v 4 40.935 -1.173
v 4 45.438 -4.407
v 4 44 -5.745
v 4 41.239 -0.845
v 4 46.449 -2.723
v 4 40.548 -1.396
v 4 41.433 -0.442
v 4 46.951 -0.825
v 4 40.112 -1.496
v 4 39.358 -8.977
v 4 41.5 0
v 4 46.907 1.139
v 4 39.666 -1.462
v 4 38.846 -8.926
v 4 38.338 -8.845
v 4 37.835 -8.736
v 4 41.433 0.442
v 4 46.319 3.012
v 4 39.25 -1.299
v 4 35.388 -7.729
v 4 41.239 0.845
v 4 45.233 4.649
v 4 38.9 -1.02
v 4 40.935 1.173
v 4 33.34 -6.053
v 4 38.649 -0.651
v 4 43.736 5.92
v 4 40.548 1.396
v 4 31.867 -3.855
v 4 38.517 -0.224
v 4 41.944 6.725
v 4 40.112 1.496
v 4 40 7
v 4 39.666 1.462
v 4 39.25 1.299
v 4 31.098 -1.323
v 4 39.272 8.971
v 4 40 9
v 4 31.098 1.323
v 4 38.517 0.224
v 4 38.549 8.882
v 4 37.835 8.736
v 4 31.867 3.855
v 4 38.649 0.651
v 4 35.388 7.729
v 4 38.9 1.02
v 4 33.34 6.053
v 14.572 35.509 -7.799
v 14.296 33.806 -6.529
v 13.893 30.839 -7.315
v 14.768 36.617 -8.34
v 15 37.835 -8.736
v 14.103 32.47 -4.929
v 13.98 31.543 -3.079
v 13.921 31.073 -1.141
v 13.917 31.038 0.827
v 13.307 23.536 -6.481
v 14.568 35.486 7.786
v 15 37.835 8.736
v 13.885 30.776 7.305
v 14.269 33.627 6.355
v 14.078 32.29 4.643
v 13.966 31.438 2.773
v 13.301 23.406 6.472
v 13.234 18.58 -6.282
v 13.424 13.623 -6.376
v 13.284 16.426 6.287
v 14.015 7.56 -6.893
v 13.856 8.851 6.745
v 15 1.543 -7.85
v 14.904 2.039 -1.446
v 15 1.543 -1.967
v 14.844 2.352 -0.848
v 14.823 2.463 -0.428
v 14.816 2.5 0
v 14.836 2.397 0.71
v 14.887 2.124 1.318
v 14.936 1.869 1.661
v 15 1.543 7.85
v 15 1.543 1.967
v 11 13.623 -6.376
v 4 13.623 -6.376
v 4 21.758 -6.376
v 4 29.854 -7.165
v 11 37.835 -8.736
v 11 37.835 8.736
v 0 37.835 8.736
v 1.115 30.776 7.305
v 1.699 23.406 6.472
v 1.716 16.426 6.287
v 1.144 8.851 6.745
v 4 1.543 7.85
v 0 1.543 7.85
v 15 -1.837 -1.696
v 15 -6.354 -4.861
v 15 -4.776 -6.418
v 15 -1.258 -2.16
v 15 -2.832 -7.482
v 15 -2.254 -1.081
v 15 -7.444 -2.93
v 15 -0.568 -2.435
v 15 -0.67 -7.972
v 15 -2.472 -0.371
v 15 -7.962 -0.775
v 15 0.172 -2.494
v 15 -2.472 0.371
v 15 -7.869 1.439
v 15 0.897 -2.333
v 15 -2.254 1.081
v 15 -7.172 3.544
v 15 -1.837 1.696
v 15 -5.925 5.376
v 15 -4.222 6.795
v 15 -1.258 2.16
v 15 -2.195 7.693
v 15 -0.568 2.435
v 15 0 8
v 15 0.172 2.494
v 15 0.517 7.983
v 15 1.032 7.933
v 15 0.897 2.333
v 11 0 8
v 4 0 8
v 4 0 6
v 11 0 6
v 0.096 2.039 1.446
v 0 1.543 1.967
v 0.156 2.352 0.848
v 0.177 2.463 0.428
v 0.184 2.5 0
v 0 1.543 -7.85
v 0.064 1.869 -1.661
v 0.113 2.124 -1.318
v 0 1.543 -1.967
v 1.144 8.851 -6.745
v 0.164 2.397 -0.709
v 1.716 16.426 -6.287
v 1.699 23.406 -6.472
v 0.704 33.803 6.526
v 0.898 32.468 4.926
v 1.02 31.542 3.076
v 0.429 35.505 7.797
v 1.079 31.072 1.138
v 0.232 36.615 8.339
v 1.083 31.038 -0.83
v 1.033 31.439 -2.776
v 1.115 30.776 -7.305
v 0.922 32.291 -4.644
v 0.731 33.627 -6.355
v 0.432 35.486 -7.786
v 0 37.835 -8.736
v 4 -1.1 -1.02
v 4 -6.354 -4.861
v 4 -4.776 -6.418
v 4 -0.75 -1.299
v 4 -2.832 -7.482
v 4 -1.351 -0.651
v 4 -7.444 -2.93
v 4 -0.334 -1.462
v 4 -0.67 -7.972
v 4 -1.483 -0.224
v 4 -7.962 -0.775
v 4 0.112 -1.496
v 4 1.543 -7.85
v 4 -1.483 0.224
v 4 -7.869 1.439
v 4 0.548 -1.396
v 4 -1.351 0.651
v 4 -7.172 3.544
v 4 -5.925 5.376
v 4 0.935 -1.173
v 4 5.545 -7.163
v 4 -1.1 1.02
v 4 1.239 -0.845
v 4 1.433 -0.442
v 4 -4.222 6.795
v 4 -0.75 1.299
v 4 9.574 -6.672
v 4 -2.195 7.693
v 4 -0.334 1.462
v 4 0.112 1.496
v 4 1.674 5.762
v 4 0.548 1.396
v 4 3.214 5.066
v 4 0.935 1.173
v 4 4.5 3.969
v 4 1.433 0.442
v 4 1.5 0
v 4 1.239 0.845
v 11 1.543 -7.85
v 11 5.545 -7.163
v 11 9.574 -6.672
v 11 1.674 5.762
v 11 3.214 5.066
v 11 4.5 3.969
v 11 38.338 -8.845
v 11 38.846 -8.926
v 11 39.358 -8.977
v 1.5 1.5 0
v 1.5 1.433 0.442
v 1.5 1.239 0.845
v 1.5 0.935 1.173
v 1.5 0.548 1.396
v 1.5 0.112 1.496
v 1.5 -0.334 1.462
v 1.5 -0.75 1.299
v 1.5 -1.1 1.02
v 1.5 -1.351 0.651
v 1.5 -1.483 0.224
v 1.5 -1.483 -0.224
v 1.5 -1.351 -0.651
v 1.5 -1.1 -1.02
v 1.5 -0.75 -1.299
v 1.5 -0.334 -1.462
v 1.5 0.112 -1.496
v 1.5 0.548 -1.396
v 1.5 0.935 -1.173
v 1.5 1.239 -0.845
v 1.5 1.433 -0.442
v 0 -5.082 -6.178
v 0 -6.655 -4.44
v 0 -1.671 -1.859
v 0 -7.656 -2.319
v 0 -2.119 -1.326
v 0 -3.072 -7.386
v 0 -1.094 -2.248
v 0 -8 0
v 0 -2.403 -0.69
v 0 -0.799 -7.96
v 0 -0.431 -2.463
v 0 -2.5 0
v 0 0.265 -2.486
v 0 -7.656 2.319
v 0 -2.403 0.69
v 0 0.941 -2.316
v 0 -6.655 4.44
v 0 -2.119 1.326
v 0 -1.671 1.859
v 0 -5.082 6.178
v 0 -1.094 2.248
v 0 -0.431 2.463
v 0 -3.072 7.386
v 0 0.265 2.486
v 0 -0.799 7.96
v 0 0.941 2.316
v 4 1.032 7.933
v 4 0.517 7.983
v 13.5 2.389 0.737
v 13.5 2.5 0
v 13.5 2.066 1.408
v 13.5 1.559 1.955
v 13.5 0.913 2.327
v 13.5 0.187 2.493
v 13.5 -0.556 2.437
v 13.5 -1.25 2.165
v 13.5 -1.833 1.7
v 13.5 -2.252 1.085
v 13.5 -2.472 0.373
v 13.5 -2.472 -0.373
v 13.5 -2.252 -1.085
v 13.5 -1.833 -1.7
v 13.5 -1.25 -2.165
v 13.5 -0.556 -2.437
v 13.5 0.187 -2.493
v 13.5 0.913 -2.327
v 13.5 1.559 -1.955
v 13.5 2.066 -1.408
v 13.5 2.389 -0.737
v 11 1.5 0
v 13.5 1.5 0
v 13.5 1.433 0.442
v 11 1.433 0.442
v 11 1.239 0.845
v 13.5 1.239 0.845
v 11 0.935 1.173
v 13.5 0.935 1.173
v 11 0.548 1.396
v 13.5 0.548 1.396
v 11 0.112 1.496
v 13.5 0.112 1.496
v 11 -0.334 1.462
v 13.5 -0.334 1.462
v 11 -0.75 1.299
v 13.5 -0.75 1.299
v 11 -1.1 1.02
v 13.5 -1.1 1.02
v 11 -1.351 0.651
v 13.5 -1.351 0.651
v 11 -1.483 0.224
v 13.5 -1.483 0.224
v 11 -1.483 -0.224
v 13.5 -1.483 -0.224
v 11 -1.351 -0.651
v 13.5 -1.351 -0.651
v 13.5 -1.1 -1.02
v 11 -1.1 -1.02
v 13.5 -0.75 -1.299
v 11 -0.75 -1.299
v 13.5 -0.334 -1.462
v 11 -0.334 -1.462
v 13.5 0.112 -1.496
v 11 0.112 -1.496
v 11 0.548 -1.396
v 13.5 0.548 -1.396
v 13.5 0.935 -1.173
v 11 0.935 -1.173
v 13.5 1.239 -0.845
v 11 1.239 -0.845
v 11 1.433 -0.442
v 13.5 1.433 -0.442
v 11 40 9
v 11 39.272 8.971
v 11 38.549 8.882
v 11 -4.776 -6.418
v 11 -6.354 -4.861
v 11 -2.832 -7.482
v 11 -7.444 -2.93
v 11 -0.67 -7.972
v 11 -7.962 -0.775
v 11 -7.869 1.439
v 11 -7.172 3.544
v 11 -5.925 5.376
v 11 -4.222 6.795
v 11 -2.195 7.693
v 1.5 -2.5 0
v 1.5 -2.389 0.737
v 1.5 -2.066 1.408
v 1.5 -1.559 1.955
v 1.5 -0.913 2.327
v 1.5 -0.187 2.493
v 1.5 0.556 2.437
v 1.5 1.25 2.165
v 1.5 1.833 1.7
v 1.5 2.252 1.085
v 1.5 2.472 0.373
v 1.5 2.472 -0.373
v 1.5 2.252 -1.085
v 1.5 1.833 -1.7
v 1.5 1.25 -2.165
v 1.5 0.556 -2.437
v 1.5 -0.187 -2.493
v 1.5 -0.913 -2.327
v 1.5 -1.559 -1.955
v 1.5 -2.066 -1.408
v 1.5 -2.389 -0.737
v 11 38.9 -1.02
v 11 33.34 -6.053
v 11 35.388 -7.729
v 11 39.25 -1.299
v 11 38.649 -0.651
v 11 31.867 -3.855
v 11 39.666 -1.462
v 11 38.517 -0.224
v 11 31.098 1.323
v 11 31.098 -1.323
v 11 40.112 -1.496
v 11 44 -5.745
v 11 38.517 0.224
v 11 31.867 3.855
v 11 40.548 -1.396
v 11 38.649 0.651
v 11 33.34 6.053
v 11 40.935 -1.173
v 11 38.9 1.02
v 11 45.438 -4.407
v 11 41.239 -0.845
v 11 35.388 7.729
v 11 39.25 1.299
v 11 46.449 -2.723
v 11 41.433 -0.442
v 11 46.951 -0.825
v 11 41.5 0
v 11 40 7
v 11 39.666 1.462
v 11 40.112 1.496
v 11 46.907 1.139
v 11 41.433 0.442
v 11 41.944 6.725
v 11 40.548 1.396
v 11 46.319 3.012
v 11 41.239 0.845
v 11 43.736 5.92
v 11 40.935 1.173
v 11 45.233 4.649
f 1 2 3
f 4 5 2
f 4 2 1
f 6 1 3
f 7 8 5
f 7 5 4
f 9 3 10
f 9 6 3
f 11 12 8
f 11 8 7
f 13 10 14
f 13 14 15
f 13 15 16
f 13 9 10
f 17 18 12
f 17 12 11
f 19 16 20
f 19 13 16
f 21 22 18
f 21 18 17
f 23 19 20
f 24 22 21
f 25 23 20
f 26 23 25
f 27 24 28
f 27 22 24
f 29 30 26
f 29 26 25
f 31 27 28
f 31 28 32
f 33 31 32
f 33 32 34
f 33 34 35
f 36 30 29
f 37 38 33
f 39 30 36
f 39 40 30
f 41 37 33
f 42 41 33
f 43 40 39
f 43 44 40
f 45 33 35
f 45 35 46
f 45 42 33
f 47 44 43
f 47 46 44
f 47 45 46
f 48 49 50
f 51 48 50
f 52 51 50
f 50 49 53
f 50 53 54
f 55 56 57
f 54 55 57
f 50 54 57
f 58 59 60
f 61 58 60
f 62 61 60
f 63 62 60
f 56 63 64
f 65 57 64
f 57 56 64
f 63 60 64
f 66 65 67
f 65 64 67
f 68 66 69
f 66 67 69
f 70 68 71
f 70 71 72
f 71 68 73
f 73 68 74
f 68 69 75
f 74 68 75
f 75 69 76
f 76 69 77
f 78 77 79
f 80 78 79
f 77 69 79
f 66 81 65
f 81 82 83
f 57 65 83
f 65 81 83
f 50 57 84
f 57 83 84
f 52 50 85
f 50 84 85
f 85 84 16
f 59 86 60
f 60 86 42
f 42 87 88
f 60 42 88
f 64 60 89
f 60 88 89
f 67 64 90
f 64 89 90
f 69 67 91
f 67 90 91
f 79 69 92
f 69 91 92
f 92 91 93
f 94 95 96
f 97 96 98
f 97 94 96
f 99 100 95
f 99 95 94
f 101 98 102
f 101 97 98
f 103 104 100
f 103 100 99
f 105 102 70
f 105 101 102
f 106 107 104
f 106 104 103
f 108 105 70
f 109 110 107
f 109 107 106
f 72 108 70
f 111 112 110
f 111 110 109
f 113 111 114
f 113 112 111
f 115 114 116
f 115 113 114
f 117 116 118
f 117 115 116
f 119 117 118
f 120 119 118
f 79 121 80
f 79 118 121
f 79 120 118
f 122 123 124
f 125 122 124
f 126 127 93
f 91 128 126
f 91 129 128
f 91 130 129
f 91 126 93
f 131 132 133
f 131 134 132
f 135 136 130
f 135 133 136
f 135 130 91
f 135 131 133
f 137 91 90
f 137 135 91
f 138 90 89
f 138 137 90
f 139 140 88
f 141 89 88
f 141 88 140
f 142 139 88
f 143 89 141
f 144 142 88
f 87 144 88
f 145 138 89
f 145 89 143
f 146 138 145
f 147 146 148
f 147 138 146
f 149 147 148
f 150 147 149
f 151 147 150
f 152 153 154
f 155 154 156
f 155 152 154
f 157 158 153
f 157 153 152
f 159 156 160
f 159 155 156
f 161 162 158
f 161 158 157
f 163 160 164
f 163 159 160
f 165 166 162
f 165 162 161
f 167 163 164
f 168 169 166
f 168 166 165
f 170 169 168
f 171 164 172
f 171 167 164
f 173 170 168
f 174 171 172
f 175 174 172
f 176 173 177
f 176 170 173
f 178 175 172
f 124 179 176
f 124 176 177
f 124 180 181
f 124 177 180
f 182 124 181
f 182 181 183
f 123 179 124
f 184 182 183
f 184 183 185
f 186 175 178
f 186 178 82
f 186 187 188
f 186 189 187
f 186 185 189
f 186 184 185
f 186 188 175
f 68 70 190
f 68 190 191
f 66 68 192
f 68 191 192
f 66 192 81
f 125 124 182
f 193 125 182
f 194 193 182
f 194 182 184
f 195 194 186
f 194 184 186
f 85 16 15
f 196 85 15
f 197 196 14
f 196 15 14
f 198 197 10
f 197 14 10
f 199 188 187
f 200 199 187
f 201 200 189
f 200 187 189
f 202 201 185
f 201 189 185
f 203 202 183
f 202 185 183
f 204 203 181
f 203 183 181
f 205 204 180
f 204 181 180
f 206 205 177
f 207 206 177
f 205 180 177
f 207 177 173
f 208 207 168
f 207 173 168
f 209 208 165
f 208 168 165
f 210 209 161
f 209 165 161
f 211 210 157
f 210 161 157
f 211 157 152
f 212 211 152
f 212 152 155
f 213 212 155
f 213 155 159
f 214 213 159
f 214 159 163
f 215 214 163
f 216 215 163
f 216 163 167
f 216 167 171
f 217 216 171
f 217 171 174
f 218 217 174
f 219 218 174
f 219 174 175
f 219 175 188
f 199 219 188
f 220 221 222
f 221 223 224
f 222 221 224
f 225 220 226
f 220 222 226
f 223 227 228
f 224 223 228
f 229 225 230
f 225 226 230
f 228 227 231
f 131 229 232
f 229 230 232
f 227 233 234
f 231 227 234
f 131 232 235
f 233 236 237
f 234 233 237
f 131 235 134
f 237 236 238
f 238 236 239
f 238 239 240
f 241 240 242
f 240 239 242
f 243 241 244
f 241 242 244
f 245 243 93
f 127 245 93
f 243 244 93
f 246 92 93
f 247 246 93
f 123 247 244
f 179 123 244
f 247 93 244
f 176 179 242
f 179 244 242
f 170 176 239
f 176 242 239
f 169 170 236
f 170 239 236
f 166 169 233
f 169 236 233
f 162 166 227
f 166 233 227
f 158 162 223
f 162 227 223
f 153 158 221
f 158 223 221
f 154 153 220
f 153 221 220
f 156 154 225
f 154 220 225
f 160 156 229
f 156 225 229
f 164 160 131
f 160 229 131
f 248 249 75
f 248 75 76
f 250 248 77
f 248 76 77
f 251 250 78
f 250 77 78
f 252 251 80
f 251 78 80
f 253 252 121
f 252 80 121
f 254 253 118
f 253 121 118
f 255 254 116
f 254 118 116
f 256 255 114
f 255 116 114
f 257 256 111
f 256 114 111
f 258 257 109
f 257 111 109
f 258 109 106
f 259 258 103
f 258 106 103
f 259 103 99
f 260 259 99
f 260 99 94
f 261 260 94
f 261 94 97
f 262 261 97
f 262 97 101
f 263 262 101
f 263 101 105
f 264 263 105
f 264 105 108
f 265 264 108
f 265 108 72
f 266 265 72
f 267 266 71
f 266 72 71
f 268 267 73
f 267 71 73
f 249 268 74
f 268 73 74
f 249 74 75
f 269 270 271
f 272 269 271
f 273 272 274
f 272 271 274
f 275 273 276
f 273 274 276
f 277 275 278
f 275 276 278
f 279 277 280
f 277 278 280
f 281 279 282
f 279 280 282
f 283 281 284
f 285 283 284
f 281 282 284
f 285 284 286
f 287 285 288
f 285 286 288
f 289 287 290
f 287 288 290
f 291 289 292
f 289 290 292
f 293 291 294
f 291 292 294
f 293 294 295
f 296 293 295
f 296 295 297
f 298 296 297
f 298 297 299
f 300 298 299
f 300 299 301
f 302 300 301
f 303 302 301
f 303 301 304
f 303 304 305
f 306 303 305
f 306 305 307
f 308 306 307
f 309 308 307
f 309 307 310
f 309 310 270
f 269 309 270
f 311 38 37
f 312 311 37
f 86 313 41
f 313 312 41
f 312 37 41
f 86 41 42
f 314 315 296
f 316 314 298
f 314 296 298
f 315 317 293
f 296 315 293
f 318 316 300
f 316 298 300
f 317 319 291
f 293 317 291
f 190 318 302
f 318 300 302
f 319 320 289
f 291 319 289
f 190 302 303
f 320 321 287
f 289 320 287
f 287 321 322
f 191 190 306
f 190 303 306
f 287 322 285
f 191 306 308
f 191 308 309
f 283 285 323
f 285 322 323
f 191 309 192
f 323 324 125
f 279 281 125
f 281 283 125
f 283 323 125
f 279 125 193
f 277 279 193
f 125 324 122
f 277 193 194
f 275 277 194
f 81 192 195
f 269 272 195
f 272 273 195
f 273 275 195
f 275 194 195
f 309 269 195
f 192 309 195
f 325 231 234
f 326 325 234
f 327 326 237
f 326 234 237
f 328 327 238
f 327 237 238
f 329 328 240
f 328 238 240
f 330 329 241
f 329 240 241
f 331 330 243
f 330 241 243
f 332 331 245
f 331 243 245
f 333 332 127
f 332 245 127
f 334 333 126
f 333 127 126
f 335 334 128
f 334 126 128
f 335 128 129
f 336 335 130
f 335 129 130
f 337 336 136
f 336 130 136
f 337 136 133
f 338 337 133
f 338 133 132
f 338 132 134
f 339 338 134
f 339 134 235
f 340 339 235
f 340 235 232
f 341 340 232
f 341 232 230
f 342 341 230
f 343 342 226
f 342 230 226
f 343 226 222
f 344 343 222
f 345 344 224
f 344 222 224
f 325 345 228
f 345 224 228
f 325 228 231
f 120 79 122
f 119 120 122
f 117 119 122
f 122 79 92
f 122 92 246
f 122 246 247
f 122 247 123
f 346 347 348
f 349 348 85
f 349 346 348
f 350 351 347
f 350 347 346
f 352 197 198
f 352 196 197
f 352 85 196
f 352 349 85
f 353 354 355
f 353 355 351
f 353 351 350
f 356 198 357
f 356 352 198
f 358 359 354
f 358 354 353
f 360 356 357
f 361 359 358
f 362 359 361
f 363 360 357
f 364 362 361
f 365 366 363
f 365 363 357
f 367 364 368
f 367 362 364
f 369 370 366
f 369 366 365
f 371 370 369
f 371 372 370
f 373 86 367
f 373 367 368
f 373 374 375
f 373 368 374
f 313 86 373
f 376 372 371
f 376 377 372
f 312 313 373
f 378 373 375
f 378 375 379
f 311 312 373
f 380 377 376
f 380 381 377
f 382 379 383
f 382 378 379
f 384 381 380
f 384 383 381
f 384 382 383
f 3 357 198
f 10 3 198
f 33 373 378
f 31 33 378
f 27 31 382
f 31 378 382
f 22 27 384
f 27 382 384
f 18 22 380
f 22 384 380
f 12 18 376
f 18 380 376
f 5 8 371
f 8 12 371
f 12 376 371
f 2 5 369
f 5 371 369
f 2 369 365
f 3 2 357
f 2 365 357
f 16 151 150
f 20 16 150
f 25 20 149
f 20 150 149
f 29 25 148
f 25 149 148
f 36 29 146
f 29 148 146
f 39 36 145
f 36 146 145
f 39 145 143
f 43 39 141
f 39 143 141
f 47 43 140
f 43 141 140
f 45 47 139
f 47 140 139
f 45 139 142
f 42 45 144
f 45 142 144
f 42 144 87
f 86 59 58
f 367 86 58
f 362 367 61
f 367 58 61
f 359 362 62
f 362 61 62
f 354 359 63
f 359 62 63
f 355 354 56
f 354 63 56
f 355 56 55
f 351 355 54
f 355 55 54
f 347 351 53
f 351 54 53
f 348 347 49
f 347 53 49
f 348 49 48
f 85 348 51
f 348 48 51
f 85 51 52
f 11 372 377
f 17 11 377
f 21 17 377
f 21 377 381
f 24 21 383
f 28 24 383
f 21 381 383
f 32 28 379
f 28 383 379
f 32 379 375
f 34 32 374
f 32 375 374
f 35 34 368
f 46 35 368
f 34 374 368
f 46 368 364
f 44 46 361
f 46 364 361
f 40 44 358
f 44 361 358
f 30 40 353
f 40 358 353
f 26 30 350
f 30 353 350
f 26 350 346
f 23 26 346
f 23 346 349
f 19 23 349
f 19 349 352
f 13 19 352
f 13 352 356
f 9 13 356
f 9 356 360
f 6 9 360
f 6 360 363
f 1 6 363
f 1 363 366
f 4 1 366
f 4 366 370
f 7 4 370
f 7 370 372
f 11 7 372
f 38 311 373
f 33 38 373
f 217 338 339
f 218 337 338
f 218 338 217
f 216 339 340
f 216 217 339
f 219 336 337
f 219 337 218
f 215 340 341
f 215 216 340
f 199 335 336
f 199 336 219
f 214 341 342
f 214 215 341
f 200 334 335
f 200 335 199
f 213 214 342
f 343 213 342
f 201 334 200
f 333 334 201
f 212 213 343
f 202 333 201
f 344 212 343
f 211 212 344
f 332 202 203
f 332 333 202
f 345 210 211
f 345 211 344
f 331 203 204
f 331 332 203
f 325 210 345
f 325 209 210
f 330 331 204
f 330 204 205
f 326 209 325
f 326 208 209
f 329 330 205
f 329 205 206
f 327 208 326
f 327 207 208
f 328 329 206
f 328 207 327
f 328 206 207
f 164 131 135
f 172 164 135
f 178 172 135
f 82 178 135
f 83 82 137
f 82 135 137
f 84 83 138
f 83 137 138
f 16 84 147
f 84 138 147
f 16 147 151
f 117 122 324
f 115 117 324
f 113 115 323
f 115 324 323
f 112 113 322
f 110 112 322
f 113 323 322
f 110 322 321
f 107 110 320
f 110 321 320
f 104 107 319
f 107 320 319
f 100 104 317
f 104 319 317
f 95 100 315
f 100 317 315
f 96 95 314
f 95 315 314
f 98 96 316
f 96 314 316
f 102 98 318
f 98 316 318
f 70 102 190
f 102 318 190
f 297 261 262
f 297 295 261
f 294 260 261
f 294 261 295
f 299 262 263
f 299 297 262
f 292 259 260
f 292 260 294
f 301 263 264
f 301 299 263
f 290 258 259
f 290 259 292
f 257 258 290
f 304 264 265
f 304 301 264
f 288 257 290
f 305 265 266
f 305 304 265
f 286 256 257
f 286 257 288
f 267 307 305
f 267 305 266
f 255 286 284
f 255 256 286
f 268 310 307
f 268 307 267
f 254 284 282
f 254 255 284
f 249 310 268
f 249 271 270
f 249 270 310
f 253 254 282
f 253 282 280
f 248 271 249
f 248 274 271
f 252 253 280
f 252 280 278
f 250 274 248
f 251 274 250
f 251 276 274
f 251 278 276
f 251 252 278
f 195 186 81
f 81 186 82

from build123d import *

# Parameters (mm, degrees)
F1_DEPTH  = 4
F3_DEPTH  = 7
F5_DEPTH  = 4
F6_R      = 9
F7_DEPTH  = 4
F8_R      = 9
F9_DEPTH  = 4
F10_R     = 2.5
F11_DEPTH = 1.5
F12_R     = 93.772443
F13_DEPTH = 12.5
F14_R     = 1.5
F15_DEPTH = 11.001
F16_R     = 1.5
F17_DEPTH = 15.001
F18_R     = 2.5
F19_DEPTH = 1.5
F21_DEPTH = 11.001


with BuildPart() as f1:
    # F0 (on Right) → F1 (new body)
    with BuildSketch(Plane.YZ):
        with BuildLine():
            ThreePointArc((37.834946, 8.735705), (19.737718, 6.302024), (1.543294, 7.849729))
            ThreePointArc((1.543294, 7.849729), (-8, 0), (1.543294, -7.849729))
            ThreePointArc((1.543294, -7.849729), (19.737718, -6.302024), (37.834946, -8.735705))
            ThreePointArc((37.834946, -8.735705), (49, 0), (37.834946, 8.735705))
        make_face()
    extrude(amount=F1_DEPTH)

    # F2 (on face) → F3 (join)
    with BuildSketch(Plane.YZ.offset(4)):
        with BuildLine():
            ThreePointArc((13.623219, -6.376131), (25.815239, -6.671862), (37.834946, -8.735705))
            ThreePointArc((37.834946, -8.735705), (49, 0), (37.834946, 8.735705))
            ThreePointArc((37.834946, 8.735705), (19.737718, 6.302024), (1.543294, 7.849729))
            ThreePointArc((1.543294, 7.849729), (0.775296, 7.962344), (0, 8))
            Line((0, 8), (0, 6))
            ThreePointArc((0, 6), (2.468627, 5.468627), (4.5, 3.968627))
            Line((4.5, 3.968627), (13.623219, -6.376131))
        make_face()
    extrude(amount=F3_DEPTH)

    # F4 (on face) → F5 (join)
    with BuildSketch(Plane.YZ.offset(11)):
        with BuildLine():
            ThreePointArc((37.834946, 8.735705), (19.737718, 6.302024), (1.543294, 7.849729))
            ThreePointArc((1.543294, 7.849729), (0.775296, 7.962344), (0, 8))
            ThreePointArc((0, 8), (-7.962344, -0.775296), (1.543294, -7.849729))
            ThreePointArc((1.543294, -7.849729), (7.556447, -6.893156), (13.623219, -6.376131))
            ThreePointArc((13.623219, -6.376131), (25.815239, -6.671862), (37.834946, -8.735705))
            ThreePointArc((37.834946, -8.735705), (49, 0), (37.834946, 8.735705))
        make_face()
    extrude(amount=F5_DEPTH)

    # F6 (on face) → F7 (cut)
    with BuildSketch(Plane.YZ.offset(15)):
        with Locations((40, 0)):
            Circle(F6_R)
    extrude(amount=-F7_DEPTH, mode=Mode.SUBTRACT)

    # F8 (on face) → F9 (cut)
    with BuildSketch(Plane(origin=(0, 0, 0), x_dir=(0, -1, 0), z_dir=(-1, 0, 0))):
        with Locations((-40, 0)):
            Circle(F8_R)
    extrude(amount=-F9_DEPTH, mode=Mode.SUBTRACT)

    # F10 (on face) → F11 (cut)
    with BuildSketch(Plane(origin=(0, 0, 0), x_dir=(0, -1, 0), z_dir=(-1, 0, 0))):
        Circle(F10_R)
    extrude(amount=-F11_DEPTH, mode=Mode.SUBTRACT)

    # F12 (on Top) → F13 (cut, symmetric)
    with BuildSketch(Plane.XY):
        with Locations((-92, 19.68912)):
            Circle(F12_R)
        with Locations((107, 19.68912)):
            Circle(F12_R)
    extrude(amount=F13_DEPTH, both=True, mode=Mode.SUBTRACT)

    # F14 (on face) → F15 (cut, through all)
    with BuildSketch(Plane.YZ.offset(11)):
        with Locations((40, 0)):
            Circle(F14_R)
    extrude(amount=-F15_DEPTH, mode=Mode.SUBTRACT)

    # F16 (on face) → F17 (cut, through all)
    with BuildSketch(Plane.YZ.offset(15)):
        Circle(F16_R)
    extrude(amount=-F17_DEPTH, mode=Mode.SUBTRACT)

    # F18 (on face) → F19 (cut)
    with BuildSketch(Plane.YZ.offset(15)):
        Circle(F18_R)
    extrude(amount=-F19_DEPTH, mode=Mode.SUBTRACT)

    # F20 (on face) → F21 (cut, through all)
    with BuildSketch(Plane.YZ.offset(11)):
        with BuildLine():
            ThreePointArc((40, 7), (46.67877, 2.096194), (44, -5.744563))
            Line((44, -5.744563), (39.357692, -8.977051))
            ThreePointArc((39.357692, -8.977051), (48.994261, -0.321359), (40, 9))
            Line((40, 9), (40, 7))
        make_face()
    extrude(amount=-F21_DEPTH, mode=Mode.SUBTRACT)


solid = f1.part
